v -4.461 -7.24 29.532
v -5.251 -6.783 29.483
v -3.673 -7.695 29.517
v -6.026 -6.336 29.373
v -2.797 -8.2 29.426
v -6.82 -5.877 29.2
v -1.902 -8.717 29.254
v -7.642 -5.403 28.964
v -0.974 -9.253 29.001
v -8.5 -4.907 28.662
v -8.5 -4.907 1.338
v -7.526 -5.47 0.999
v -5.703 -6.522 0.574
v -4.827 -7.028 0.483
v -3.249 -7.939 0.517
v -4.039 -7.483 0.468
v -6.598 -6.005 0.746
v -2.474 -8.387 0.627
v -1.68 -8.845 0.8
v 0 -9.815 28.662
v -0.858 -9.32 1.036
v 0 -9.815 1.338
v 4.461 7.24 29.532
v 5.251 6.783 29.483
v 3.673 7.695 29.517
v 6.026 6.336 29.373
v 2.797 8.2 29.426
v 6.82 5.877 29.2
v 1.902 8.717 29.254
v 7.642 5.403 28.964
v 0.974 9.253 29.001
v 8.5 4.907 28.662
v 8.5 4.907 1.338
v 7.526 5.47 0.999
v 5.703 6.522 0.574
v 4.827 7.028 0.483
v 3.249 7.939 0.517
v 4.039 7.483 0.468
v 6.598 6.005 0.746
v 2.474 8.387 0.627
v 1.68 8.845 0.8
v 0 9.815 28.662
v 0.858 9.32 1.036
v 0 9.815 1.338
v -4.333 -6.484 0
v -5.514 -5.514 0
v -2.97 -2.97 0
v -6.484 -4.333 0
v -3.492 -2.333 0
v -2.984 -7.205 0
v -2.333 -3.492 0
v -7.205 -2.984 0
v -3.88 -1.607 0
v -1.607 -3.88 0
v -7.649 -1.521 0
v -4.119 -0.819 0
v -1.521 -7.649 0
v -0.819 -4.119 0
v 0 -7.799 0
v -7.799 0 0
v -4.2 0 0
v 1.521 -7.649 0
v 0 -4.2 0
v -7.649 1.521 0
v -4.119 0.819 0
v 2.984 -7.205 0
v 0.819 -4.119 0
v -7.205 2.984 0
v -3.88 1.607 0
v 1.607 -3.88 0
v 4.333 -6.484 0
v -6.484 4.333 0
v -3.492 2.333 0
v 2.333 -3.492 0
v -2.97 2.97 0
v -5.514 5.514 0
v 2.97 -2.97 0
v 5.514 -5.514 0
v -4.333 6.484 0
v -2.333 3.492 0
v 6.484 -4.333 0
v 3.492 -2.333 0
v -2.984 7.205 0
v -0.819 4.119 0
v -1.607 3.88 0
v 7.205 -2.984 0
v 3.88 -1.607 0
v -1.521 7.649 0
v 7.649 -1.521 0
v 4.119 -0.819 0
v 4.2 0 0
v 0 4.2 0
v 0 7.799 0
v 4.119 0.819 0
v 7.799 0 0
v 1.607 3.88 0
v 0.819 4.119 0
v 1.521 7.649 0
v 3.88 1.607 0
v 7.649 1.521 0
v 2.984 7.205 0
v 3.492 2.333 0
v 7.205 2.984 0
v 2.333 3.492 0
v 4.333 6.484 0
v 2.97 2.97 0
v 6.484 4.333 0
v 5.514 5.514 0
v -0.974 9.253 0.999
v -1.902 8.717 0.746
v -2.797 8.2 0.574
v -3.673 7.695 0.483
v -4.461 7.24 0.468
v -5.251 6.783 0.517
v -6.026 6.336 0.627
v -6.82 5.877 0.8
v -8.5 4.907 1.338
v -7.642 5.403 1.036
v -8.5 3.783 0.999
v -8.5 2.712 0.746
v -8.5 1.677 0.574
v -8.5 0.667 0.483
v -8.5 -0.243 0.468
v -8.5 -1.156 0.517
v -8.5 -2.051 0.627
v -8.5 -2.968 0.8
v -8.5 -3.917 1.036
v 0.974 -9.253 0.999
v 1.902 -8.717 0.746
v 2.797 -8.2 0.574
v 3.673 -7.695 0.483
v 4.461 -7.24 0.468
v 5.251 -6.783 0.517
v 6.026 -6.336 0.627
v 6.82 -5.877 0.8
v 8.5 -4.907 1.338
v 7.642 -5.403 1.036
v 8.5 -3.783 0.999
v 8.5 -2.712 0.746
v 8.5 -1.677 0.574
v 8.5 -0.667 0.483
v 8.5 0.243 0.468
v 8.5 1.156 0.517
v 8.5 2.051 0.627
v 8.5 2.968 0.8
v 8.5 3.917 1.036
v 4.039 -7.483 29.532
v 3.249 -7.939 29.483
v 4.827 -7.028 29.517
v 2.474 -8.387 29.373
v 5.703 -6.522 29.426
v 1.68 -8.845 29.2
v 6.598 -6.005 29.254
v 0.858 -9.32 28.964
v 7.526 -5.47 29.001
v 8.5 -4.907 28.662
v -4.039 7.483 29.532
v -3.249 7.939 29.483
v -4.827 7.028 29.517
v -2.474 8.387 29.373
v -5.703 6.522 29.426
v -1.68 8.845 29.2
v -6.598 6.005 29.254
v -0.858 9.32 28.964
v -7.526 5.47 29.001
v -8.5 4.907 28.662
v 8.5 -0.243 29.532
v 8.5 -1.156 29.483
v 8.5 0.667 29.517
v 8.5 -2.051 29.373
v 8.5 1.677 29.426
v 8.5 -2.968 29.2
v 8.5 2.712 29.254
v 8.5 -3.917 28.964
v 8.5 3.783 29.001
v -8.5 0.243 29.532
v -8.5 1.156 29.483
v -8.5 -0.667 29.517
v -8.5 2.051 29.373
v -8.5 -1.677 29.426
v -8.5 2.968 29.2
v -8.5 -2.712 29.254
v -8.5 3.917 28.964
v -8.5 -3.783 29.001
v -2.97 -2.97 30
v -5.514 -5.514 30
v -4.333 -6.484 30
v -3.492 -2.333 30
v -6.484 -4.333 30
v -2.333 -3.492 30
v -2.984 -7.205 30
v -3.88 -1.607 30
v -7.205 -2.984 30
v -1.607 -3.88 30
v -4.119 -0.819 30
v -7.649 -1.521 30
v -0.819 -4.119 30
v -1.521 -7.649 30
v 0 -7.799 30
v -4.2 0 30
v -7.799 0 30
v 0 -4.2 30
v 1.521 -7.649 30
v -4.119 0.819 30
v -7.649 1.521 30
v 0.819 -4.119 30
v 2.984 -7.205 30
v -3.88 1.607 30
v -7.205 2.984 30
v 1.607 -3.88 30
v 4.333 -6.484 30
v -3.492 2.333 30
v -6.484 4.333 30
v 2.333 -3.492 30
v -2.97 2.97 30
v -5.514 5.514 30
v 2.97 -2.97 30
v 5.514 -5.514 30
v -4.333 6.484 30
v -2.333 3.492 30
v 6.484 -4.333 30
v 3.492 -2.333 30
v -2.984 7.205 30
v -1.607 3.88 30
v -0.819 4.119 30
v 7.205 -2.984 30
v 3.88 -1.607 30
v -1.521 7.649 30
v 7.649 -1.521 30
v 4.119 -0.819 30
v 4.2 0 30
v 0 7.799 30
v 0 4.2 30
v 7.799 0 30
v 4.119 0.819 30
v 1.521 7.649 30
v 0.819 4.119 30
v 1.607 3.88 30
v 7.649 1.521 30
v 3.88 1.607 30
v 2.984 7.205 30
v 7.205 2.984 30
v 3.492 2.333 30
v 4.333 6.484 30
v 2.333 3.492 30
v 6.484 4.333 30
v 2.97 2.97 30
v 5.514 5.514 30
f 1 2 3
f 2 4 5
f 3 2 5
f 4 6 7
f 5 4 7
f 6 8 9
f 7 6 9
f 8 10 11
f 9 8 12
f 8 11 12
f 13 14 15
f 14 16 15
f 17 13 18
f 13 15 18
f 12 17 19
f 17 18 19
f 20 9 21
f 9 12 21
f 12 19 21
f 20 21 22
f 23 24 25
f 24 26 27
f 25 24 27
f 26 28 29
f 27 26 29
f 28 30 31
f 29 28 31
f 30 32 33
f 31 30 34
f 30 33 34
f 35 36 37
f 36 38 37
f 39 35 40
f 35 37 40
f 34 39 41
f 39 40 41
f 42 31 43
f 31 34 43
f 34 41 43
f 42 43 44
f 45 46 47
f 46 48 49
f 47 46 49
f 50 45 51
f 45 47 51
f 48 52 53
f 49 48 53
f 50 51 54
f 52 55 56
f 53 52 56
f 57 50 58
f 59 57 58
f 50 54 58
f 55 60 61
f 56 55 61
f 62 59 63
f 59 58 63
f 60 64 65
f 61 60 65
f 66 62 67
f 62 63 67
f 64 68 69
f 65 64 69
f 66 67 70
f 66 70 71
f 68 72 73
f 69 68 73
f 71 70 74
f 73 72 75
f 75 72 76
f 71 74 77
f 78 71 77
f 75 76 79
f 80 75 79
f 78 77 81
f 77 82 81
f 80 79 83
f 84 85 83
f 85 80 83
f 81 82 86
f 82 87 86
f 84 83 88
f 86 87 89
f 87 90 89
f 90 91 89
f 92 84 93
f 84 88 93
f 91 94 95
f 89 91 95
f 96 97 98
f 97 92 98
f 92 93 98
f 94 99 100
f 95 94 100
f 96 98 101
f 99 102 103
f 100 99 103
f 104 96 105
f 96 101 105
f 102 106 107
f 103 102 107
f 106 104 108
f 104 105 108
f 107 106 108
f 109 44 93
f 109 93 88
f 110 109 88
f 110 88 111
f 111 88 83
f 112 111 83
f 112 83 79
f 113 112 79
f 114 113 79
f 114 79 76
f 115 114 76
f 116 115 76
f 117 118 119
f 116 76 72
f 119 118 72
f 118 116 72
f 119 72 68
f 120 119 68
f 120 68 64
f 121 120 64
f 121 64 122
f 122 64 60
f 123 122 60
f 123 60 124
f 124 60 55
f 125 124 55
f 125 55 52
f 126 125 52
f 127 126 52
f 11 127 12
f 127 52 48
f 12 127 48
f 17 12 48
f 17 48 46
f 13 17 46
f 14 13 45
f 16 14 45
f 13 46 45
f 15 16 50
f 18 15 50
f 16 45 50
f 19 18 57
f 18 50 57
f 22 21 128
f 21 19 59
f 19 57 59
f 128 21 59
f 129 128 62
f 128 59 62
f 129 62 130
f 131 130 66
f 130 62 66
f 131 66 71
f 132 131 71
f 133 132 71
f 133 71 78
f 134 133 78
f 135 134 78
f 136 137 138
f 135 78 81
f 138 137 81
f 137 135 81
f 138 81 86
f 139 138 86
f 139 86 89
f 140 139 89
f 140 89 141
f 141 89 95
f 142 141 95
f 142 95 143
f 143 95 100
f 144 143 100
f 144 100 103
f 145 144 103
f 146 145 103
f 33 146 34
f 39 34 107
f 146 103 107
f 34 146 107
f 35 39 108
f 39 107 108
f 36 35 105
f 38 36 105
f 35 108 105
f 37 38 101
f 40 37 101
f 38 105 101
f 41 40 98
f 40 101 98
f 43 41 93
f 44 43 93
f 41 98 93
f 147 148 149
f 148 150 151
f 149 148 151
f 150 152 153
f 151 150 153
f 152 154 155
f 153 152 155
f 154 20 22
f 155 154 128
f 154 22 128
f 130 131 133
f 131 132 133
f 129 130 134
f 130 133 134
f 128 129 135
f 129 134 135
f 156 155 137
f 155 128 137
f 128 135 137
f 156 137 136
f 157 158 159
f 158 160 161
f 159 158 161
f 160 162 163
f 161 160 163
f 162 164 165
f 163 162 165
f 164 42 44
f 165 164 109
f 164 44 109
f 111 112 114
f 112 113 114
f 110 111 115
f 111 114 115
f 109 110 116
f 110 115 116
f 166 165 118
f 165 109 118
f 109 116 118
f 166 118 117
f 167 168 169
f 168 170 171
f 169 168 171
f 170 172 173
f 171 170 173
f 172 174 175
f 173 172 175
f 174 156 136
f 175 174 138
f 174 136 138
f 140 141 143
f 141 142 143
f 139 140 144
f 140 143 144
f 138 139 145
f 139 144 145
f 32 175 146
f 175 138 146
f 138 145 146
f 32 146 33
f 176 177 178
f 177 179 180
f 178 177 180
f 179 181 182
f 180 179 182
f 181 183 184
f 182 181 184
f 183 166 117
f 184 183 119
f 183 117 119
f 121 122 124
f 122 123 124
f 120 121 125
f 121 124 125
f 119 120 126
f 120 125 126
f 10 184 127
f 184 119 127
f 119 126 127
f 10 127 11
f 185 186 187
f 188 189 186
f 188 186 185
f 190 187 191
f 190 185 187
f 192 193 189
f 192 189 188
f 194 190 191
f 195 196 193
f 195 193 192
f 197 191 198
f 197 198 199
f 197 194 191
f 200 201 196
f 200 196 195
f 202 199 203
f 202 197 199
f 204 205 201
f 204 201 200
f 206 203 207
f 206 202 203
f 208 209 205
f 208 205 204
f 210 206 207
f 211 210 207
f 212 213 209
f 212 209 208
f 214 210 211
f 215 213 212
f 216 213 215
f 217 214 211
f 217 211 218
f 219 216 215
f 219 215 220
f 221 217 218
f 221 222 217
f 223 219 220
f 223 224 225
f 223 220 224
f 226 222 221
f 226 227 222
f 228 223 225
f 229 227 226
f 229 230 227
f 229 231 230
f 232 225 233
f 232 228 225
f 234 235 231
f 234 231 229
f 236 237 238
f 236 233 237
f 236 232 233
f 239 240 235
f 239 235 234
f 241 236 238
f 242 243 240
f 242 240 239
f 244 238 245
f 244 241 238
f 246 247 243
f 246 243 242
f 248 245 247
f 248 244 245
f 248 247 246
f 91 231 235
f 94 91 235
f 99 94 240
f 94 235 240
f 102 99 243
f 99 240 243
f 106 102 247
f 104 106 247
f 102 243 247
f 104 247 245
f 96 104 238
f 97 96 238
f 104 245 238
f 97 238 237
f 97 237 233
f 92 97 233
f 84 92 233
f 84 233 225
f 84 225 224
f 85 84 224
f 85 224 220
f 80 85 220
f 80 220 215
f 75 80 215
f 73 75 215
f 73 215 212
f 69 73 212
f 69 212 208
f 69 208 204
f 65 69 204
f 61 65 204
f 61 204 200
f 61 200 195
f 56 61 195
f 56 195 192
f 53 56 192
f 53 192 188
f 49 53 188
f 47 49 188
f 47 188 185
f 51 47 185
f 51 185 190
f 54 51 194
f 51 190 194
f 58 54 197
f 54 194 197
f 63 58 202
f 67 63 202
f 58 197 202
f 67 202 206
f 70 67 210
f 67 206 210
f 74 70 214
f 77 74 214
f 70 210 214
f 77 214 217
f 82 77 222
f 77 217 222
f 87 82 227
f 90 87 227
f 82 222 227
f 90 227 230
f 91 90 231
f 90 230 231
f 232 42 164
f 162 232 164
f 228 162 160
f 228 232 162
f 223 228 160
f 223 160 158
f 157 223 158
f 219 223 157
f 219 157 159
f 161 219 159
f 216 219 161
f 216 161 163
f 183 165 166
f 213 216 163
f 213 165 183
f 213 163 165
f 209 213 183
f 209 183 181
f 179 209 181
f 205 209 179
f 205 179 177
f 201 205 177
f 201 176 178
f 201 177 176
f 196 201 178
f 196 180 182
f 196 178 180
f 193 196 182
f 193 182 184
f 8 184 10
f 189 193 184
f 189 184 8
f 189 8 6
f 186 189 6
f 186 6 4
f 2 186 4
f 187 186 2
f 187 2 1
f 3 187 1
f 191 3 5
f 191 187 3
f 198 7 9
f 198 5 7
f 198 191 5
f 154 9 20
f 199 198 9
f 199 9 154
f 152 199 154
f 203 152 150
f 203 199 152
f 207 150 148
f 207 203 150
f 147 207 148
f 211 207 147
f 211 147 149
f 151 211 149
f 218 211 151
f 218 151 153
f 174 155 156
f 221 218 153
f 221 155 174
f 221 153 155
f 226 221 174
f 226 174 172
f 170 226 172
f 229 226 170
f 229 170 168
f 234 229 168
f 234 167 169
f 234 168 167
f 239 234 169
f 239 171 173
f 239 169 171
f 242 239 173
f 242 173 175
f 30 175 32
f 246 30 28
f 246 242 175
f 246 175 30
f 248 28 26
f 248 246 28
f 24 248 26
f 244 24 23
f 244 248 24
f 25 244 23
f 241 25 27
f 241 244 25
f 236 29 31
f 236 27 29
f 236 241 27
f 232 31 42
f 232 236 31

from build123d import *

# Parameters (mm, degrees)
BOSS_EXTRUDE1_DEPTH = 30
SKETCH2_R           = 4.2
CUT_EXTRUDE1_DEPTH  = 31


with BuildPart() as part:
    # Sketch1 → Boss-Extrude1 (new body)
    with BuildSketch(Plane.XY):
        Polygon((0, 9.814954576), (-8.5, 4.907477288), (-8.5, -4.907477288), (0, -9.814954576), (8.5, -4.907477288), (8.5, 4.907477288), align=None)
    extrude(amount=BOSS_EXTRUDE1_DEPTH)

    # Sketch2 → Cut-Extrude1 (cut, through all)
    with BuildSketch(Plane.XY.offset(30)):
        Circle(SKETCH2_R)
    extrude(amount=-CUT_EXTRUDE1_DEPTH, mode=Mode.SUBTRACT)

    # Sketch3 → Cut-Revolve1 (revolve, cut)
    with BuildSketch(Plane(origin=(0, 0, 0), x_dir=(0, 0, -1), z_dir=(1, 0, 0))):
        Polygon((-28.661748937, 9.814954576), (-30, 7.798581685), (-30, 9.814954576), align=None)
        Polygon((0, 7.798581685), (0, 9.814954576), (-1.338251063, 9.814954576), align=None)
    revolve(axis=Axis((0, 0, -5.872116431), (0, 0, 1)), mode=Mode.SUBTRACT)


solid = part.part
